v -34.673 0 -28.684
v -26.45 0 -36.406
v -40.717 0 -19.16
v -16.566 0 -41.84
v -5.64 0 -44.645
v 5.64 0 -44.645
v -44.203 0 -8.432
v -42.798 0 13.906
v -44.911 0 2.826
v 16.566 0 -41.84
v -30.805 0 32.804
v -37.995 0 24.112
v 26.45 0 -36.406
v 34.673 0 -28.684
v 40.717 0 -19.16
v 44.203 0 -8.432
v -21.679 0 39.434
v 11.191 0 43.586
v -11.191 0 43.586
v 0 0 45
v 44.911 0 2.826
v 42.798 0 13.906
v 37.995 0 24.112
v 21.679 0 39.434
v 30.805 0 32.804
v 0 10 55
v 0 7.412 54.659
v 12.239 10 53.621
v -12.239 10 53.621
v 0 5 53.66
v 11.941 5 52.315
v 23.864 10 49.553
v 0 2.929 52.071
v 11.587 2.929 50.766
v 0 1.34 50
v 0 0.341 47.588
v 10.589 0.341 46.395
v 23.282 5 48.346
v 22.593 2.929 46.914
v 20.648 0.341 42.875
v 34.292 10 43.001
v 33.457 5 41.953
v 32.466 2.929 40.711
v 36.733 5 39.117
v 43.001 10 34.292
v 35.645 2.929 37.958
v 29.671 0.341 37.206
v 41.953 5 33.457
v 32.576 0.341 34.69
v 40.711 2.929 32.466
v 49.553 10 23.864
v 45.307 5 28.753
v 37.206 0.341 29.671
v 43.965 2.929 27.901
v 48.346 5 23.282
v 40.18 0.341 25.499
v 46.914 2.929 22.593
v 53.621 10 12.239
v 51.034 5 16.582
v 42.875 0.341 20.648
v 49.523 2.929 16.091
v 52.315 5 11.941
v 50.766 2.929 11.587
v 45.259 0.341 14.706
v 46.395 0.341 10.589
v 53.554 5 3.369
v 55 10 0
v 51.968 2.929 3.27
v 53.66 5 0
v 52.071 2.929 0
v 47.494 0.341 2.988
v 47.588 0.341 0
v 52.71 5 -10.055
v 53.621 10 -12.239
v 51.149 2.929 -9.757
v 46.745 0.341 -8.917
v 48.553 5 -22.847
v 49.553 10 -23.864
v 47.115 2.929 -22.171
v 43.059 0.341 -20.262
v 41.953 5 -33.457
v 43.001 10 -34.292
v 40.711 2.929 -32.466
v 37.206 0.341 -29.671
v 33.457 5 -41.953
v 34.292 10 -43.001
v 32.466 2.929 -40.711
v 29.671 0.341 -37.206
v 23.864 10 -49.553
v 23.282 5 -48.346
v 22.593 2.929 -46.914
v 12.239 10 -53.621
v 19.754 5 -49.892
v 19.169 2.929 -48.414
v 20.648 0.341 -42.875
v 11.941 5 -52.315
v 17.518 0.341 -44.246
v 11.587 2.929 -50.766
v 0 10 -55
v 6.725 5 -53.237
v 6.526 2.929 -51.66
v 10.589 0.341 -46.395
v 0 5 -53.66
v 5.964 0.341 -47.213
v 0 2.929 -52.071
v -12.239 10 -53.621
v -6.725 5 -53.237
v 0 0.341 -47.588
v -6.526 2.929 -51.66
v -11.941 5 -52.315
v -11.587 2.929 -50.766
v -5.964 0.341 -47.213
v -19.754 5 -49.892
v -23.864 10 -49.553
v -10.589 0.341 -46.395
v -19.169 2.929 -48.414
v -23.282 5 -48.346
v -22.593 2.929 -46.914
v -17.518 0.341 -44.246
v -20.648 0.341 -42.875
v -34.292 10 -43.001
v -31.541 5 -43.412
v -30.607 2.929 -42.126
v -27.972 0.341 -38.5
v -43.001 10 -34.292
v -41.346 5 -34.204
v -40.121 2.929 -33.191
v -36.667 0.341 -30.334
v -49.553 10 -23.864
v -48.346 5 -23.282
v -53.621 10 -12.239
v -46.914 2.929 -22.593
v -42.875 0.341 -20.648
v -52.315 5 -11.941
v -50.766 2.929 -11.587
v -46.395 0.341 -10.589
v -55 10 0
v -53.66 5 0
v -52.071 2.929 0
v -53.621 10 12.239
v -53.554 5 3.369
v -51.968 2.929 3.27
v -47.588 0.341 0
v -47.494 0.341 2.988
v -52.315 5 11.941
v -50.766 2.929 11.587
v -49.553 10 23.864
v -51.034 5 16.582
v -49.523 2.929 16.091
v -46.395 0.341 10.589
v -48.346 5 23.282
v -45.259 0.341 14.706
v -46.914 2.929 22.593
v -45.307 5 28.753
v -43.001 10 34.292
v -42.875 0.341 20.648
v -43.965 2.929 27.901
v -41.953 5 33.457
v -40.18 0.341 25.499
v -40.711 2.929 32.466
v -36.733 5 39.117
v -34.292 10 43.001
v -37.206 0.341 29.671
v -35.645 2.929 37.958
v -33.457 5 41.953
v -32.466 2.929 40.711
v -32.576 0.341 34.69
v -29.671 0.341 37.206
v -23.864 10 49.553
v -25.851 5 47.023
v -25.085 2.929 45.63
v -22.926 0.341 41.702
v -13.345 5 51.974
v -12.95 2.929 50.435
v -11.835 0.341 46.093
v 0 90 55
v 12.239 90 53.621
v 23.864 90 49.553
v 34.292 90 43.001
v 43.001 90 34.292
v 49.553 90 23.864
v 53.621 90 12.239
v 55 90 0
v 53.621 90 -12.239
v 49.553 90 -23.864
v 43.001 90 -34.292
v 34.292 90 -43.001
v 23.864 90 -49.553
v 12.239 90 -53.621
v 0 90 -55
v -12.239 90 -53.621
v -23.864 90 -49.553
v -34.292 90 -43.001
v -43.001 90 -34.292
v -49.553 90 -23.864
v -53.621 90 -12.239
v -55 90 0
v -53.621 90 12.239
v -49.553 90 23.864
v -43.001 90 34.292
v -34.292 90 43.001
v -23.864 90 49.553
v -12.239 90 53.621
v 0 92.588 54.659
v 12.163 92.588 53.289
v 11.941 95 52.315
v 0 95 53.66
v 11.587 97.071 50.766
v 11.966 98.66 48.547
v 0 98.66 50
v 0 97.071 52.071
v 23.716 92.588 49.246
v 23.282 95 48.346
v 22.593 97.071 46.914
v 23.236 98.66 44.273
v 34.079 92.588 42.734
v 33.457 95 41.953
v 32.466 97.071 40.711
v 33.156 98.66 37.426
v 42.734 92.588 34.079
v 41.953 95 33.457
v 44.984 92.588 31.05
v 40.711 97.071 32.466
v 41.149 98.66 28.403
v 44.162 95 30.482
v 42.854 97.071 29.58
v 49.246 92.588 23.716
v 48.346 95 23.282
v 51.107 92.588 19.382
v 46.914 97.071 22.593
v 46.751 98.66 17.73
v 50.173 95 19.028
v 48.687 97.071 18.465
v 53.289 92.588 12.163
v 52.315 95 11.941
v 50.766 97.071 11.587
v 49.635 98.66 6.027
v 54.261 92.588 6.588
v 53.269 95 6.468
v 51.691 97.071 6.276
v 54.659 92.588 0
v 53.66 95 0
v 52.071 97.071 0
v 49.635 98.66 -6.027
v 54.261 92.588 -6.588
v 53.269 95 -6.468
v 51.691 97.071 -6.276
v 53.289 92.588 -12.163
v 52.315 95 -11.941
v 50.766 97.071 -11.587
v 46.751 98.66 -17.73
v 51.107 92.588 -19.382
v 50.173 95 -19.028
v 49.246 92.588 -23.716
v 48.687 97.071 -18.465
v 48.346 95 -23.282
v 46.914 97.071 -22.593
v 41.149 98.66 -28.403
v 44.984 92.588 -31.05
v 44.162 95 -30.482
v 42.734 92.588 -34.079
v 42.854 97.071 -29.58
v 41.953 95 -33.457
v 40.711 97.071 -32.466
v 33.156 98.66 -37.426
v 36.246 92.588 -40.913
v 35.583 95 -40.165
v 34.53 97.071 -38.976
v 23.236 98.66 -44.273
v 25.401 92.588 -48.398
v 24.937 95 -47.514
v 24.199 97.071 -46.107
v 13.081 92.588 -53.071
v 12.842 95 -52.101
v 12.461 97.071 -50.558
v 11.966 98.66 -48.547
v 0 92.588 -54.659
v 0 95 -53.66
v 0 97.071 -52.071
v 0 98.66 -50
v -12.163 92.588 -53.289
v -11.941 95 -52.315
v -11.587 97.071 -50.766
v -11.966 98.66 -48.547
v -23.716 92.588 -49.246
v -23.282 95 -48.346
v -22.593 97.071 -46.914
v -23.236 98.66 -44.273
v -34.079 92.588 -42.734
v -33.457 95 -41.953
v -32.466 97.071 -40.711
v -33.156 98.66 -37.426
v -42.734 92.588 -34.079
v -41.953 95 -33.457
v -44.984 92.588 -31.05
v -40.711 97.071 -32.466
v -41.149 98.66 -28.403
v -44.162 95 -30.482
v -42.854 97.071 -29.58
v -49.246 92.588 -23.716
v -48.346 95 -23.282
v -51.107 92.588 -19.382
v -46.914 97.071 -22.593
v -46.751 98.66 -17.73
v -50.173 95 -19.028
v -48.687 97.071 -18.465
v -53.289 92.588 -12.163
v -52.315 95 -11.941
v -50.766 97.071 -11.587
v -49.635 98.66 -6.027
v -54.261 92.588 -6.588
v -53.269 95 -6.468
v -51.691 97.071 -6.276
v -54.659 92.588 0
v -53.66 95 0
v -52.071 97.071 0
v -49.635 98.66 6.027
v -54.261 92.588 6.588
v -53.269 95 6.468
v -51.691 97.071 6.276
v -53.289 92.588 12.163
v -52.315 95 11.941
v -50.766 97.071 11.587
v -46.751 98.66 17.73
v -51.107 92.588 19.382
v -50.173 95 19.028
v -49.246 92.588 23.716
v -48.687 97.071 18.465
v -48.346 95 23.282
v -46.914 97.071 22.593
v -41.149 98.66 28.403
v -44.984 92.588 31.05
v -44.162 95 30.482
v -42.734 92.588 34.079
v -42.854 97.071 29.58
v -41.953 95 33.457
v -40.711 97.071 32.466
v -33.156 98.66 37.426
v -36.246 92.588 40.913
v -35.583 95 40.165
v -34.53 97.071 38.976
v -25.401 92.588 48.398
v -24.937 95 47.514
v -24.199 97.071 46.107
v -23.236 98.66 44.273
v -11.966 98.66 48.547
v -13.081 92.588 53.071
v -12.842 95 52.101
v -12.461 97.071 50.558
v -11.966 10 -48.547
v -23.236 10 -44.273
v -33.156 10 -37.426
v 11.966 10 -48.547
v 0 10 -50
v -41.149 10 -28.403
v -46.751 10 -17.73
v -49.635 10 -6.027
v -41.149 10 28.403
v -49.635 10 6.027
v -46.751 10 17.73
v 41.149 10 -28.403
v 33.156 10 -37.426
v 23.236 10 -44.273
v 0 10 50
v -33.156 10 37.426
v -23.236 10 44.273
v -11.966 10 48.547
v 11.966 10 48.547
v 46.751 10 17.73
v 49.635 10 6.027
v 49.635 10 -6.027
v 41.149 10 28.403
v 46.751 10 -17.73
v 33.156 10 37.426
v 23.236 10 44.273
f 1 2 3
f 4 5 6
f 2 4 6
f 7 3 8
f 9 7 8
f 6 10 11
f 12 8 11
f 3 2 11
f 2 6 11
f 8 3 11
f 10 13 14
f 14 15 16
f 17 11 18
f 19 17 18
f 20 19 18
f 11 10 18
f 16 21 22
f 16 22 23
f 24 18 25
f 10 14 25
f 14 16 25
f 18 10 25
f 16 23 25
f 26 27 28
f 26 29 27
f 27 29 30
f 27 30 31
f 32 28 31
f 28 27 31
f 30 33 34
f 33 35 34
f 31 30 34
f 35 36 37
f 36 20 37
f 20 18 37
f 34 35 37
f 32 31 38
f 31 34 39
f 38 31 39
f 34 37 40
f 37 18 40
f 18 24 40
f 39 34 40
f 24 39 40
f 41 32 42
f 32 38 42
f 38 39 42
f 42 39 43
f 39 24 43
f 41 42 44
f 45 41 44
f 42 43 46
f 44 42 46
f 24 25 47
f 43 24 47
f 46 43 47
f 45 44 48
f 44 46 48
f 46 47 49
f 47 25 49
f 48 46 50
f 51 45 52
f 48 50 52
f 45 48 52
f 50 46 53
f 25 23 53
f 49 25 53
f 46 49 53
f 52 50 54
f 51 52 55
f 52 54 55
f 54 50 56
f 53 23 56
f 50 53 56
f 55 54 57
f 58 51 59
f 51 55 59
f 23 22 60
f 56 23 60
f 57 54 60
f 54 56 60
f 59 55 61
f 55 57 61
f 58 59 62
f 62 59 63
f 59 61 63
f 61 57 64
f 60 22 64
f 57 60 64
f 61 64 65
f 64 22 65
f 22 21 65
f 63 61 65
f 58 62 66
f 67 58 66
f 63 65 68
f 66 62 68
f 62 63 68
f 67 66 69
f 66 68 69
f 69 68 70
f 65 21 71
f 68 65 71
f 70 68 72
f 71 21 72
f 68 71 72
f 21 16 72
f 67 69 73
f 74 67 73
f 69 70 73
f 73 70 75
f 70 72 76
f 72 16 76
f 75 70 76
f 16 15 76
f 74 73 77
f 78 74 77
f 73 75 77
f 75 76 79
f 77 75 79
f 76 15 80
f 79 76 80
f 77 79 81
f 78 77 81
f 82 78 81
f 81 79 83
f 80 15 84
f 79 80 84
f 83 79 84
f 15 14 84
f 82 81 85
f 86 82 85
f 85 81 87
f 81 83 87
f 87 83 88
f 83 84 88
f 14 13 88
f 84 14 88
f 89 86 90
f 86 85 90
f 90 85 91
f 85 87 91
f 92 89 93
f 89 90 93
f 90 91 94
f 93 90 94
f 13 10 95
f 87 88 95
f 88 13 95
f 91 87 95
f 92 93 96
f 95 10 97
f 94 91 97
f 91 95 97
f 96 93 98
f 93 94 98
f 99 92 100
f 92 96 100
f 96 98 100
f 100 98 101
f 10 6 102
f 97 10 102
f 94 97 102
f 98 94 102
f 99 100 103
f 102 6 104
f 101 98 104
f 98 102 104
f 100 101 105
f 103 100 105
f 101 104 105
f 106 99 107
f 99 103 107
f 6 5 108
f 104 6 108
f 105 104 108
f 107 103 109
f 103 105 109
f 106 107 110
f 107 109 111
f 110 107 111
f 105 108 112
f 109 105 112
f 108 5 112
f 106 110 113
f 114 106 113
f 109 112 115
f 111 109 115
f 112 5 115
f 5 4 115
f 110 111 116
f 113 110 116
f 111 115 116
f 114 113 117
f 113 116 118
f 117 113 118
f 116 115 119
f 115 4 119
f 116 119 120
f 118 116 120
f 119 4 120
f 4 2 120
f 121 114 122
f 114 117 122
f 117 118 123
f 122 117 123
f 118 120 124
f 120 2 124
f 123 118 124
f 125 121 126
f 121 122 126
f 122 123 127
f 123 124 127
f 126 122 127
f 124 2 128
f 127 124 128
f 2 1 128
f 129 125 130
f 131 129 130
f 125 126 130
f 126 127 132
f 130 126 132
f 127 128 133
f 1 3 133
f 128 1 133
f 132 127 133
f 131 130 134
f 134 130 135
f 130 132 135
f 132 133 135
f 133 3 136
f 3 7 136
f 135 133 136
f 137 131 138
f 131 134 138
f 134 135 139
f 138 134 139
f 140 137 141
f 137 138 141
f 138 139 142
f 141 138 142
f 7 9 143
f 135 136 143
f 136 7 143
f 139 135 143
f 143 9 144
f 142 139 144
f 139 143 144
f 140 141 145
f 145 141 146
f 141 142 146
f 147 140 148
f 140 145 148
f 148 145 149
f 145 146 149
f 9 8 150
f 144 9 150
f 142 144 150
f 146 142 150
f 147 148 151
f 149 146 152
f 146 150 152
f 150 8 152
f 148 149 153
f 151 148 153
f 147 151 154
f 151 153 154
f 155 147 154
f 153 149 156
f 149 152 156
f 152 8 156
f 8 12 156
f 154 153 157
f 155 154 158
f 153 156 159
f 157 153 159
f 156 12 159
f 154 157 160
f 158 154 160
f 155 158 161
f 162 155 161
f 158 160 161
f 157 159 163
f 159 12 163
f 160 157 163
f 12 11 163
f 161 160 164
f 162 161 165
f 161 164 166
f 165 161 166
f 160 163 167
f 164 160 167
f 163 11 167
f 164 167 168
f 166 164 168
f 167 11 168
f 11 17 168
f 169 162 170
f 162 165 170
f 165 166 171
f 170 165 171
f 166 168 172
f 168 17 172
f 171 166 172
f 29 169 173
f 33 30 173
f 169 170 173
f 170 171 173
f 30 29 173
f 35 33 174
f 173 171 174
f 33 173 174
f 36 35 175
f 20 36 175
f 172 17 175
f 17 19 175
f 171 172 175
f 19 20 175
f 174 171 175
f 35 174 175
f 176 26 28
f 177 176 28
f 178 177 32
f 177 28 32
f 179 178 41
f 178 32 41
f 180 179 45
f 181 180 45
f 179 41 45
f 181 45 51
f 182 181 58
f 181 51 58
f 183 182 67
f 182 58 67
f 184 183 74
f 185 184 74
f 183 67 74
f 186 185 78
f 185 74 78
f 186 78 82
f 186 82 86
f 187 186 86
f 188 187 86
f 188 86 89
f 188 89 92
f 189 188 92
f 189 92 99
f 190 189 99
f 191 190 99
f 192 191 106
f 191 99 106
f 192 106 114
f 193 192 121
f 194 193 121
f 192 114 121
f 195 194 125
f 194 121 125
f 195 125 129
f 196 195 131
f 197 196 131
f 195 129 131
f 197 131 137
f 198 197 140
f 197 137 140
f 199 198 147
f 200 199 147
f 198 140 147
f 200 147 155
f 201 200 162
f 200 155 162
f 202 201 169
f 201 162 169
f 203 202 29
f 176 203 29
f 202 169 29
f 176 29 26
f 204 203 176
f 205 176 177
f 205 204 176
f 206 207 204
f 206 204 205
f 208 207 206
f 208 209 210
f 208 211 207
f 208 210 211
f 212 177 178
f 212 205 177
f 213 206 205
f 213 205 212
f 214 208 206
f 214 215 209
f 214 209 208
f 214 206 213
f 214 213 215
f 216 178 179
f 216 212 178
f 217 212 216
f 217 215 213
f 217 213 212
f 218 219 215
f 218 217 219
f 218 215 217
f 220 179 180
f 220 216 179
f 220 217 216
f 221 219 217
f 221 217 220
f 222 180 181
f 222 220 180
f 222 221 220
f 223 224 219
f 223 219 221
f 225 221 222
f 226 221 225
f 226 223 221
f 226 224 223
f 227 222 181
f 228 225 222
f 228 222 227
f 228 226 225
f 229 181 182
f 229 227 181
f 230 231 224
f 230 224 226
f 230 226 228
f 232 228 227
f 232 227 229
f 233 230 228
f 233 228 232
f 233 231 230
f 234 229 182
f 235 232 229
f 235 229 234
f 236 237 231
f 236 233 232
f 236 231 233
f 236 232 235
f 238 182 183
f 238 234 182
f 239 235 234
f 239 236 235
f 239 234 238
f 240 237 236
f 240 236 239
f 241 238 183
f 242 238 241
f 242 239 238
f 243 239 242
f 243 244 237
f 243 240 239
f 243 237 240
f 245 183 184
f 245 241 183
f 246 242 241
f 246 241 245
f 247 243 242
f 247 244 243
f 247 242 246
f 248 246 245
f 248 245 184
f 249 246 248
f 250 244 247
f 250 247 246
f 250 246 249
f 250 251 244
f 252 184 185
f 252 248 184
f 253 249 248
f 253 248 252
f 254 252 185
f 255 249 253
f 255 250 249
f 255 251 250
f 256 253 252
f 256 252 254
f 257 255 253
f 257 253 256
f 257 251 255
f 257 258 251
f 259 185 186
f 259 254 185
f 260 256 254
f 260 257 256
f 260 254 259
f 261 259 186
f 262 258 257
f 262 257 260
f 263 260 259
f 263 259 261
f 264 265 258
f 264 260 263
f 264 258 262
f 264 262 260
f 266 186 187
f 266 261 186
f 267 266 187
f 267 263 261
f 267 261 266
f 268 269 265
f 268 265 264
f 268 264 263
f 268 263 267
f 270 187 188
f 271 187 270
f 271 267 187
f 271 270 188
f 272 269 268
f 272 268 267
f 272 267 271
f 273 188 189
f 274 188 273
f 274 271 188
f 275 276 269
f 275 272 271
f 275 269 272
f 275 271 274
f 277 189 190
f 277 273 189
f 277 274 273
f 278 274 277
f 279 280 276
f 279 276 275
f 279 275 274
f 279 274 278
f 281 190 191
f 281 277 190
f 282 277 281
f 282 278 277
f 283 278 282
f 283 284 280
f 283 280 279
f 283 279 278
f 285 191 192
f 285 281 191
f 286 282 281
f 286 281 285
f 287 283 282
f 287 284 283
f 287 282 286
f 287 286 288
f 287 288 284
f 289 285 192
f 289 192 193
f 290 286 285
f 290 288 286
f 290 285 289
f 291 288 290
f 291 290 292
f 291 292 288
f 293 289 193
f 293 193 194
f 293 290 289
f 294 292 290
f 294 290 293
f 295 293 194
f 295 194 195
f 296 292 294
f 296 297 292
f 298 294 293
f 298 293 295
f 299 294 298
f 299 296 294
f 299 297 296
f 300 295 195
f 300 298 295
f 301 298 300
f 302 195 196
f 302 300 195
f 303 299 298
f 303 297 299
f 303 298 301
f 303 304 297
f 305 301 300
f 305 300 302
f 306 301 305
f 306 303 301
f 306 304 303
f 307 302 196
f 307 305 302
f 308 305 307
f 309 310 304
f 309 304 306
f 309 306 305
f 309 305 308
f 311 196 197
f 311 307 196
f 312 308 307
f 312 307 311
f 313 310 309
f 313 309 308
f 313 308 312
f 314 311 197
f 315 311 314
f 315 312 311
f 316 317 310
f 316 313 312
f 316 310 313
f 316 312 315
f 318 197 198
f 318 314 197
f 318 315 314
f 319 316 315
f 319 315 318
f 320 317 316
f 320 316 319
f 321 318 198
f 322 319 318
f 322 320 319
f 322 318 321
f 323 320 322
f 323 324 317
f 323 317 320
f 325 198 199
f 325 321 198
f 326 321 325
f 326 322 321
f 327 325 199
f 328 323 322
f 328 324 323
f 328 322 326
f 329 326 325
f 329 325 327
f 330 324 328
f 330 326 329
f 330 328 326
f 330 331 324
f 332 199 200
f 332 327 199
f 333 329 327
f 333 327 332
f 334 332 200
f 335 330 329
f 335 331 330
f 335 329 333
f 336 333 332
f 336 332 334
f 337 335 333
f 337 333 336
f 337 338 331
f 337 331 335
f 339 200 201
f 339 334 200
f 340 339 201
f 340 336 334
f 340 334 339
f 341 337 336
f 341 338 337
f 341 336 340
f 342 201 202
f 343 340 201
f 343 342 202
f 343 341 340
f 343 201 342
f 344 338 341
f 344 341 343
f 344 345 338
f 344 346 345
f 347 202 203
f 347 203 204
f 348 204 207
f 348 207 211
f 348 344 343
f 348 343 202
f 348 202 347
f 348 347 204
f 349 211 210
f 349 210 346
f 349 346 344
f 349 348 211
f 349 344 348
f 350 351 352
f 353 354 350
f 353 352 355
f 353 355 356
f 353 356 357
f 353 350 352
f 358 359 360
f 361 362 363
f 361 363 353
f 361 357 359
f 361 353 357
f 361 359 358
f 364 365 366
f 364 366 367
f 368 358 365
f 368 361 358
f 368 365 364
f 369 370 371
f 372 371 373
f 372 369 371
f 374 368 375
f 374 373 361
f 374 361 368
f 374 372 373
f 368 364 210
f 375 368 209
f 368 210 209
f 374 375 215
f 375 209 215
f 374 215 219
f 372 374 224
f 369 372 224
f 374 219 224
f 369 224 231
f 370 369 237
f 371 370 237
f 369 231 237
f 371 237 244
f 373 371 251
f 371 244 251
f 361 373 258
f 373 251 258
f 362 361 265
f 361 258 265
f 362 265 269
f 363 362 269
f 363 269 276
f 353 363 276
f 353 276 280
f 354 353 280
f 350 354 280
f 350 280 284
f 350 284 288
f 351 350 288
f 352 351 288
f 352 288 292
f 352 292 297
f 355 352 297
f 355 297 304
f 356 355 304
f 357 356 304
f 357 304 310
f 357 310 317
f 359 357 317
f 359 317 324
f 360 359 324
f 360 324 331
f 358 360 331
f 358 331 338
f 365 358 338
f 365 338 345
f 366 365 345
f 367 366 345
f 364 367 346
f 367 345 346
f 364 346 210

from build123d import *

# Parameters (mm, degrees)
SKETCH1_R           = 55
BOSS_EXTRUDE1_DEPTH = 100
FILLET1_R           = 10
SKETCH3_R           = 50
CUT_EXTRUDE1_DEPTH  = 90


with BuildPart() as part:
    # Sketch1 → Boss-Extrude1 (new body)
    with BuildSketch(Plane(origin=(0, 0, 0), x_dir=(1, 0, 0), z_dir=(0, 1, 0))):
        Circle(SKETCH1_R)
    extrude(amount=BOSS_EXTRUDE1_DEPTH)

    # Fillet1
    fillet1_edges = [part.edges().sort_by_distance(p)[0] for p in [
        (-55, 0, 0),
        (-55, 100, 0),
    ]]
    fillet(fillet1_edges, radius=FILLET1_R)

    # Sketch3 → Cut-Extrude1 (cut)
    with BuildSketch(Plane(origin=(0, 100, 0), x_dir=(1, 0, 0), z_dir=(0, 1, 0))):
        Circle(SKETCH3_R)
    extrude(amount=-CUT_EXTRUDE1_DEPTH, mode=Mode.SUBTRACT)


solid = part.part
